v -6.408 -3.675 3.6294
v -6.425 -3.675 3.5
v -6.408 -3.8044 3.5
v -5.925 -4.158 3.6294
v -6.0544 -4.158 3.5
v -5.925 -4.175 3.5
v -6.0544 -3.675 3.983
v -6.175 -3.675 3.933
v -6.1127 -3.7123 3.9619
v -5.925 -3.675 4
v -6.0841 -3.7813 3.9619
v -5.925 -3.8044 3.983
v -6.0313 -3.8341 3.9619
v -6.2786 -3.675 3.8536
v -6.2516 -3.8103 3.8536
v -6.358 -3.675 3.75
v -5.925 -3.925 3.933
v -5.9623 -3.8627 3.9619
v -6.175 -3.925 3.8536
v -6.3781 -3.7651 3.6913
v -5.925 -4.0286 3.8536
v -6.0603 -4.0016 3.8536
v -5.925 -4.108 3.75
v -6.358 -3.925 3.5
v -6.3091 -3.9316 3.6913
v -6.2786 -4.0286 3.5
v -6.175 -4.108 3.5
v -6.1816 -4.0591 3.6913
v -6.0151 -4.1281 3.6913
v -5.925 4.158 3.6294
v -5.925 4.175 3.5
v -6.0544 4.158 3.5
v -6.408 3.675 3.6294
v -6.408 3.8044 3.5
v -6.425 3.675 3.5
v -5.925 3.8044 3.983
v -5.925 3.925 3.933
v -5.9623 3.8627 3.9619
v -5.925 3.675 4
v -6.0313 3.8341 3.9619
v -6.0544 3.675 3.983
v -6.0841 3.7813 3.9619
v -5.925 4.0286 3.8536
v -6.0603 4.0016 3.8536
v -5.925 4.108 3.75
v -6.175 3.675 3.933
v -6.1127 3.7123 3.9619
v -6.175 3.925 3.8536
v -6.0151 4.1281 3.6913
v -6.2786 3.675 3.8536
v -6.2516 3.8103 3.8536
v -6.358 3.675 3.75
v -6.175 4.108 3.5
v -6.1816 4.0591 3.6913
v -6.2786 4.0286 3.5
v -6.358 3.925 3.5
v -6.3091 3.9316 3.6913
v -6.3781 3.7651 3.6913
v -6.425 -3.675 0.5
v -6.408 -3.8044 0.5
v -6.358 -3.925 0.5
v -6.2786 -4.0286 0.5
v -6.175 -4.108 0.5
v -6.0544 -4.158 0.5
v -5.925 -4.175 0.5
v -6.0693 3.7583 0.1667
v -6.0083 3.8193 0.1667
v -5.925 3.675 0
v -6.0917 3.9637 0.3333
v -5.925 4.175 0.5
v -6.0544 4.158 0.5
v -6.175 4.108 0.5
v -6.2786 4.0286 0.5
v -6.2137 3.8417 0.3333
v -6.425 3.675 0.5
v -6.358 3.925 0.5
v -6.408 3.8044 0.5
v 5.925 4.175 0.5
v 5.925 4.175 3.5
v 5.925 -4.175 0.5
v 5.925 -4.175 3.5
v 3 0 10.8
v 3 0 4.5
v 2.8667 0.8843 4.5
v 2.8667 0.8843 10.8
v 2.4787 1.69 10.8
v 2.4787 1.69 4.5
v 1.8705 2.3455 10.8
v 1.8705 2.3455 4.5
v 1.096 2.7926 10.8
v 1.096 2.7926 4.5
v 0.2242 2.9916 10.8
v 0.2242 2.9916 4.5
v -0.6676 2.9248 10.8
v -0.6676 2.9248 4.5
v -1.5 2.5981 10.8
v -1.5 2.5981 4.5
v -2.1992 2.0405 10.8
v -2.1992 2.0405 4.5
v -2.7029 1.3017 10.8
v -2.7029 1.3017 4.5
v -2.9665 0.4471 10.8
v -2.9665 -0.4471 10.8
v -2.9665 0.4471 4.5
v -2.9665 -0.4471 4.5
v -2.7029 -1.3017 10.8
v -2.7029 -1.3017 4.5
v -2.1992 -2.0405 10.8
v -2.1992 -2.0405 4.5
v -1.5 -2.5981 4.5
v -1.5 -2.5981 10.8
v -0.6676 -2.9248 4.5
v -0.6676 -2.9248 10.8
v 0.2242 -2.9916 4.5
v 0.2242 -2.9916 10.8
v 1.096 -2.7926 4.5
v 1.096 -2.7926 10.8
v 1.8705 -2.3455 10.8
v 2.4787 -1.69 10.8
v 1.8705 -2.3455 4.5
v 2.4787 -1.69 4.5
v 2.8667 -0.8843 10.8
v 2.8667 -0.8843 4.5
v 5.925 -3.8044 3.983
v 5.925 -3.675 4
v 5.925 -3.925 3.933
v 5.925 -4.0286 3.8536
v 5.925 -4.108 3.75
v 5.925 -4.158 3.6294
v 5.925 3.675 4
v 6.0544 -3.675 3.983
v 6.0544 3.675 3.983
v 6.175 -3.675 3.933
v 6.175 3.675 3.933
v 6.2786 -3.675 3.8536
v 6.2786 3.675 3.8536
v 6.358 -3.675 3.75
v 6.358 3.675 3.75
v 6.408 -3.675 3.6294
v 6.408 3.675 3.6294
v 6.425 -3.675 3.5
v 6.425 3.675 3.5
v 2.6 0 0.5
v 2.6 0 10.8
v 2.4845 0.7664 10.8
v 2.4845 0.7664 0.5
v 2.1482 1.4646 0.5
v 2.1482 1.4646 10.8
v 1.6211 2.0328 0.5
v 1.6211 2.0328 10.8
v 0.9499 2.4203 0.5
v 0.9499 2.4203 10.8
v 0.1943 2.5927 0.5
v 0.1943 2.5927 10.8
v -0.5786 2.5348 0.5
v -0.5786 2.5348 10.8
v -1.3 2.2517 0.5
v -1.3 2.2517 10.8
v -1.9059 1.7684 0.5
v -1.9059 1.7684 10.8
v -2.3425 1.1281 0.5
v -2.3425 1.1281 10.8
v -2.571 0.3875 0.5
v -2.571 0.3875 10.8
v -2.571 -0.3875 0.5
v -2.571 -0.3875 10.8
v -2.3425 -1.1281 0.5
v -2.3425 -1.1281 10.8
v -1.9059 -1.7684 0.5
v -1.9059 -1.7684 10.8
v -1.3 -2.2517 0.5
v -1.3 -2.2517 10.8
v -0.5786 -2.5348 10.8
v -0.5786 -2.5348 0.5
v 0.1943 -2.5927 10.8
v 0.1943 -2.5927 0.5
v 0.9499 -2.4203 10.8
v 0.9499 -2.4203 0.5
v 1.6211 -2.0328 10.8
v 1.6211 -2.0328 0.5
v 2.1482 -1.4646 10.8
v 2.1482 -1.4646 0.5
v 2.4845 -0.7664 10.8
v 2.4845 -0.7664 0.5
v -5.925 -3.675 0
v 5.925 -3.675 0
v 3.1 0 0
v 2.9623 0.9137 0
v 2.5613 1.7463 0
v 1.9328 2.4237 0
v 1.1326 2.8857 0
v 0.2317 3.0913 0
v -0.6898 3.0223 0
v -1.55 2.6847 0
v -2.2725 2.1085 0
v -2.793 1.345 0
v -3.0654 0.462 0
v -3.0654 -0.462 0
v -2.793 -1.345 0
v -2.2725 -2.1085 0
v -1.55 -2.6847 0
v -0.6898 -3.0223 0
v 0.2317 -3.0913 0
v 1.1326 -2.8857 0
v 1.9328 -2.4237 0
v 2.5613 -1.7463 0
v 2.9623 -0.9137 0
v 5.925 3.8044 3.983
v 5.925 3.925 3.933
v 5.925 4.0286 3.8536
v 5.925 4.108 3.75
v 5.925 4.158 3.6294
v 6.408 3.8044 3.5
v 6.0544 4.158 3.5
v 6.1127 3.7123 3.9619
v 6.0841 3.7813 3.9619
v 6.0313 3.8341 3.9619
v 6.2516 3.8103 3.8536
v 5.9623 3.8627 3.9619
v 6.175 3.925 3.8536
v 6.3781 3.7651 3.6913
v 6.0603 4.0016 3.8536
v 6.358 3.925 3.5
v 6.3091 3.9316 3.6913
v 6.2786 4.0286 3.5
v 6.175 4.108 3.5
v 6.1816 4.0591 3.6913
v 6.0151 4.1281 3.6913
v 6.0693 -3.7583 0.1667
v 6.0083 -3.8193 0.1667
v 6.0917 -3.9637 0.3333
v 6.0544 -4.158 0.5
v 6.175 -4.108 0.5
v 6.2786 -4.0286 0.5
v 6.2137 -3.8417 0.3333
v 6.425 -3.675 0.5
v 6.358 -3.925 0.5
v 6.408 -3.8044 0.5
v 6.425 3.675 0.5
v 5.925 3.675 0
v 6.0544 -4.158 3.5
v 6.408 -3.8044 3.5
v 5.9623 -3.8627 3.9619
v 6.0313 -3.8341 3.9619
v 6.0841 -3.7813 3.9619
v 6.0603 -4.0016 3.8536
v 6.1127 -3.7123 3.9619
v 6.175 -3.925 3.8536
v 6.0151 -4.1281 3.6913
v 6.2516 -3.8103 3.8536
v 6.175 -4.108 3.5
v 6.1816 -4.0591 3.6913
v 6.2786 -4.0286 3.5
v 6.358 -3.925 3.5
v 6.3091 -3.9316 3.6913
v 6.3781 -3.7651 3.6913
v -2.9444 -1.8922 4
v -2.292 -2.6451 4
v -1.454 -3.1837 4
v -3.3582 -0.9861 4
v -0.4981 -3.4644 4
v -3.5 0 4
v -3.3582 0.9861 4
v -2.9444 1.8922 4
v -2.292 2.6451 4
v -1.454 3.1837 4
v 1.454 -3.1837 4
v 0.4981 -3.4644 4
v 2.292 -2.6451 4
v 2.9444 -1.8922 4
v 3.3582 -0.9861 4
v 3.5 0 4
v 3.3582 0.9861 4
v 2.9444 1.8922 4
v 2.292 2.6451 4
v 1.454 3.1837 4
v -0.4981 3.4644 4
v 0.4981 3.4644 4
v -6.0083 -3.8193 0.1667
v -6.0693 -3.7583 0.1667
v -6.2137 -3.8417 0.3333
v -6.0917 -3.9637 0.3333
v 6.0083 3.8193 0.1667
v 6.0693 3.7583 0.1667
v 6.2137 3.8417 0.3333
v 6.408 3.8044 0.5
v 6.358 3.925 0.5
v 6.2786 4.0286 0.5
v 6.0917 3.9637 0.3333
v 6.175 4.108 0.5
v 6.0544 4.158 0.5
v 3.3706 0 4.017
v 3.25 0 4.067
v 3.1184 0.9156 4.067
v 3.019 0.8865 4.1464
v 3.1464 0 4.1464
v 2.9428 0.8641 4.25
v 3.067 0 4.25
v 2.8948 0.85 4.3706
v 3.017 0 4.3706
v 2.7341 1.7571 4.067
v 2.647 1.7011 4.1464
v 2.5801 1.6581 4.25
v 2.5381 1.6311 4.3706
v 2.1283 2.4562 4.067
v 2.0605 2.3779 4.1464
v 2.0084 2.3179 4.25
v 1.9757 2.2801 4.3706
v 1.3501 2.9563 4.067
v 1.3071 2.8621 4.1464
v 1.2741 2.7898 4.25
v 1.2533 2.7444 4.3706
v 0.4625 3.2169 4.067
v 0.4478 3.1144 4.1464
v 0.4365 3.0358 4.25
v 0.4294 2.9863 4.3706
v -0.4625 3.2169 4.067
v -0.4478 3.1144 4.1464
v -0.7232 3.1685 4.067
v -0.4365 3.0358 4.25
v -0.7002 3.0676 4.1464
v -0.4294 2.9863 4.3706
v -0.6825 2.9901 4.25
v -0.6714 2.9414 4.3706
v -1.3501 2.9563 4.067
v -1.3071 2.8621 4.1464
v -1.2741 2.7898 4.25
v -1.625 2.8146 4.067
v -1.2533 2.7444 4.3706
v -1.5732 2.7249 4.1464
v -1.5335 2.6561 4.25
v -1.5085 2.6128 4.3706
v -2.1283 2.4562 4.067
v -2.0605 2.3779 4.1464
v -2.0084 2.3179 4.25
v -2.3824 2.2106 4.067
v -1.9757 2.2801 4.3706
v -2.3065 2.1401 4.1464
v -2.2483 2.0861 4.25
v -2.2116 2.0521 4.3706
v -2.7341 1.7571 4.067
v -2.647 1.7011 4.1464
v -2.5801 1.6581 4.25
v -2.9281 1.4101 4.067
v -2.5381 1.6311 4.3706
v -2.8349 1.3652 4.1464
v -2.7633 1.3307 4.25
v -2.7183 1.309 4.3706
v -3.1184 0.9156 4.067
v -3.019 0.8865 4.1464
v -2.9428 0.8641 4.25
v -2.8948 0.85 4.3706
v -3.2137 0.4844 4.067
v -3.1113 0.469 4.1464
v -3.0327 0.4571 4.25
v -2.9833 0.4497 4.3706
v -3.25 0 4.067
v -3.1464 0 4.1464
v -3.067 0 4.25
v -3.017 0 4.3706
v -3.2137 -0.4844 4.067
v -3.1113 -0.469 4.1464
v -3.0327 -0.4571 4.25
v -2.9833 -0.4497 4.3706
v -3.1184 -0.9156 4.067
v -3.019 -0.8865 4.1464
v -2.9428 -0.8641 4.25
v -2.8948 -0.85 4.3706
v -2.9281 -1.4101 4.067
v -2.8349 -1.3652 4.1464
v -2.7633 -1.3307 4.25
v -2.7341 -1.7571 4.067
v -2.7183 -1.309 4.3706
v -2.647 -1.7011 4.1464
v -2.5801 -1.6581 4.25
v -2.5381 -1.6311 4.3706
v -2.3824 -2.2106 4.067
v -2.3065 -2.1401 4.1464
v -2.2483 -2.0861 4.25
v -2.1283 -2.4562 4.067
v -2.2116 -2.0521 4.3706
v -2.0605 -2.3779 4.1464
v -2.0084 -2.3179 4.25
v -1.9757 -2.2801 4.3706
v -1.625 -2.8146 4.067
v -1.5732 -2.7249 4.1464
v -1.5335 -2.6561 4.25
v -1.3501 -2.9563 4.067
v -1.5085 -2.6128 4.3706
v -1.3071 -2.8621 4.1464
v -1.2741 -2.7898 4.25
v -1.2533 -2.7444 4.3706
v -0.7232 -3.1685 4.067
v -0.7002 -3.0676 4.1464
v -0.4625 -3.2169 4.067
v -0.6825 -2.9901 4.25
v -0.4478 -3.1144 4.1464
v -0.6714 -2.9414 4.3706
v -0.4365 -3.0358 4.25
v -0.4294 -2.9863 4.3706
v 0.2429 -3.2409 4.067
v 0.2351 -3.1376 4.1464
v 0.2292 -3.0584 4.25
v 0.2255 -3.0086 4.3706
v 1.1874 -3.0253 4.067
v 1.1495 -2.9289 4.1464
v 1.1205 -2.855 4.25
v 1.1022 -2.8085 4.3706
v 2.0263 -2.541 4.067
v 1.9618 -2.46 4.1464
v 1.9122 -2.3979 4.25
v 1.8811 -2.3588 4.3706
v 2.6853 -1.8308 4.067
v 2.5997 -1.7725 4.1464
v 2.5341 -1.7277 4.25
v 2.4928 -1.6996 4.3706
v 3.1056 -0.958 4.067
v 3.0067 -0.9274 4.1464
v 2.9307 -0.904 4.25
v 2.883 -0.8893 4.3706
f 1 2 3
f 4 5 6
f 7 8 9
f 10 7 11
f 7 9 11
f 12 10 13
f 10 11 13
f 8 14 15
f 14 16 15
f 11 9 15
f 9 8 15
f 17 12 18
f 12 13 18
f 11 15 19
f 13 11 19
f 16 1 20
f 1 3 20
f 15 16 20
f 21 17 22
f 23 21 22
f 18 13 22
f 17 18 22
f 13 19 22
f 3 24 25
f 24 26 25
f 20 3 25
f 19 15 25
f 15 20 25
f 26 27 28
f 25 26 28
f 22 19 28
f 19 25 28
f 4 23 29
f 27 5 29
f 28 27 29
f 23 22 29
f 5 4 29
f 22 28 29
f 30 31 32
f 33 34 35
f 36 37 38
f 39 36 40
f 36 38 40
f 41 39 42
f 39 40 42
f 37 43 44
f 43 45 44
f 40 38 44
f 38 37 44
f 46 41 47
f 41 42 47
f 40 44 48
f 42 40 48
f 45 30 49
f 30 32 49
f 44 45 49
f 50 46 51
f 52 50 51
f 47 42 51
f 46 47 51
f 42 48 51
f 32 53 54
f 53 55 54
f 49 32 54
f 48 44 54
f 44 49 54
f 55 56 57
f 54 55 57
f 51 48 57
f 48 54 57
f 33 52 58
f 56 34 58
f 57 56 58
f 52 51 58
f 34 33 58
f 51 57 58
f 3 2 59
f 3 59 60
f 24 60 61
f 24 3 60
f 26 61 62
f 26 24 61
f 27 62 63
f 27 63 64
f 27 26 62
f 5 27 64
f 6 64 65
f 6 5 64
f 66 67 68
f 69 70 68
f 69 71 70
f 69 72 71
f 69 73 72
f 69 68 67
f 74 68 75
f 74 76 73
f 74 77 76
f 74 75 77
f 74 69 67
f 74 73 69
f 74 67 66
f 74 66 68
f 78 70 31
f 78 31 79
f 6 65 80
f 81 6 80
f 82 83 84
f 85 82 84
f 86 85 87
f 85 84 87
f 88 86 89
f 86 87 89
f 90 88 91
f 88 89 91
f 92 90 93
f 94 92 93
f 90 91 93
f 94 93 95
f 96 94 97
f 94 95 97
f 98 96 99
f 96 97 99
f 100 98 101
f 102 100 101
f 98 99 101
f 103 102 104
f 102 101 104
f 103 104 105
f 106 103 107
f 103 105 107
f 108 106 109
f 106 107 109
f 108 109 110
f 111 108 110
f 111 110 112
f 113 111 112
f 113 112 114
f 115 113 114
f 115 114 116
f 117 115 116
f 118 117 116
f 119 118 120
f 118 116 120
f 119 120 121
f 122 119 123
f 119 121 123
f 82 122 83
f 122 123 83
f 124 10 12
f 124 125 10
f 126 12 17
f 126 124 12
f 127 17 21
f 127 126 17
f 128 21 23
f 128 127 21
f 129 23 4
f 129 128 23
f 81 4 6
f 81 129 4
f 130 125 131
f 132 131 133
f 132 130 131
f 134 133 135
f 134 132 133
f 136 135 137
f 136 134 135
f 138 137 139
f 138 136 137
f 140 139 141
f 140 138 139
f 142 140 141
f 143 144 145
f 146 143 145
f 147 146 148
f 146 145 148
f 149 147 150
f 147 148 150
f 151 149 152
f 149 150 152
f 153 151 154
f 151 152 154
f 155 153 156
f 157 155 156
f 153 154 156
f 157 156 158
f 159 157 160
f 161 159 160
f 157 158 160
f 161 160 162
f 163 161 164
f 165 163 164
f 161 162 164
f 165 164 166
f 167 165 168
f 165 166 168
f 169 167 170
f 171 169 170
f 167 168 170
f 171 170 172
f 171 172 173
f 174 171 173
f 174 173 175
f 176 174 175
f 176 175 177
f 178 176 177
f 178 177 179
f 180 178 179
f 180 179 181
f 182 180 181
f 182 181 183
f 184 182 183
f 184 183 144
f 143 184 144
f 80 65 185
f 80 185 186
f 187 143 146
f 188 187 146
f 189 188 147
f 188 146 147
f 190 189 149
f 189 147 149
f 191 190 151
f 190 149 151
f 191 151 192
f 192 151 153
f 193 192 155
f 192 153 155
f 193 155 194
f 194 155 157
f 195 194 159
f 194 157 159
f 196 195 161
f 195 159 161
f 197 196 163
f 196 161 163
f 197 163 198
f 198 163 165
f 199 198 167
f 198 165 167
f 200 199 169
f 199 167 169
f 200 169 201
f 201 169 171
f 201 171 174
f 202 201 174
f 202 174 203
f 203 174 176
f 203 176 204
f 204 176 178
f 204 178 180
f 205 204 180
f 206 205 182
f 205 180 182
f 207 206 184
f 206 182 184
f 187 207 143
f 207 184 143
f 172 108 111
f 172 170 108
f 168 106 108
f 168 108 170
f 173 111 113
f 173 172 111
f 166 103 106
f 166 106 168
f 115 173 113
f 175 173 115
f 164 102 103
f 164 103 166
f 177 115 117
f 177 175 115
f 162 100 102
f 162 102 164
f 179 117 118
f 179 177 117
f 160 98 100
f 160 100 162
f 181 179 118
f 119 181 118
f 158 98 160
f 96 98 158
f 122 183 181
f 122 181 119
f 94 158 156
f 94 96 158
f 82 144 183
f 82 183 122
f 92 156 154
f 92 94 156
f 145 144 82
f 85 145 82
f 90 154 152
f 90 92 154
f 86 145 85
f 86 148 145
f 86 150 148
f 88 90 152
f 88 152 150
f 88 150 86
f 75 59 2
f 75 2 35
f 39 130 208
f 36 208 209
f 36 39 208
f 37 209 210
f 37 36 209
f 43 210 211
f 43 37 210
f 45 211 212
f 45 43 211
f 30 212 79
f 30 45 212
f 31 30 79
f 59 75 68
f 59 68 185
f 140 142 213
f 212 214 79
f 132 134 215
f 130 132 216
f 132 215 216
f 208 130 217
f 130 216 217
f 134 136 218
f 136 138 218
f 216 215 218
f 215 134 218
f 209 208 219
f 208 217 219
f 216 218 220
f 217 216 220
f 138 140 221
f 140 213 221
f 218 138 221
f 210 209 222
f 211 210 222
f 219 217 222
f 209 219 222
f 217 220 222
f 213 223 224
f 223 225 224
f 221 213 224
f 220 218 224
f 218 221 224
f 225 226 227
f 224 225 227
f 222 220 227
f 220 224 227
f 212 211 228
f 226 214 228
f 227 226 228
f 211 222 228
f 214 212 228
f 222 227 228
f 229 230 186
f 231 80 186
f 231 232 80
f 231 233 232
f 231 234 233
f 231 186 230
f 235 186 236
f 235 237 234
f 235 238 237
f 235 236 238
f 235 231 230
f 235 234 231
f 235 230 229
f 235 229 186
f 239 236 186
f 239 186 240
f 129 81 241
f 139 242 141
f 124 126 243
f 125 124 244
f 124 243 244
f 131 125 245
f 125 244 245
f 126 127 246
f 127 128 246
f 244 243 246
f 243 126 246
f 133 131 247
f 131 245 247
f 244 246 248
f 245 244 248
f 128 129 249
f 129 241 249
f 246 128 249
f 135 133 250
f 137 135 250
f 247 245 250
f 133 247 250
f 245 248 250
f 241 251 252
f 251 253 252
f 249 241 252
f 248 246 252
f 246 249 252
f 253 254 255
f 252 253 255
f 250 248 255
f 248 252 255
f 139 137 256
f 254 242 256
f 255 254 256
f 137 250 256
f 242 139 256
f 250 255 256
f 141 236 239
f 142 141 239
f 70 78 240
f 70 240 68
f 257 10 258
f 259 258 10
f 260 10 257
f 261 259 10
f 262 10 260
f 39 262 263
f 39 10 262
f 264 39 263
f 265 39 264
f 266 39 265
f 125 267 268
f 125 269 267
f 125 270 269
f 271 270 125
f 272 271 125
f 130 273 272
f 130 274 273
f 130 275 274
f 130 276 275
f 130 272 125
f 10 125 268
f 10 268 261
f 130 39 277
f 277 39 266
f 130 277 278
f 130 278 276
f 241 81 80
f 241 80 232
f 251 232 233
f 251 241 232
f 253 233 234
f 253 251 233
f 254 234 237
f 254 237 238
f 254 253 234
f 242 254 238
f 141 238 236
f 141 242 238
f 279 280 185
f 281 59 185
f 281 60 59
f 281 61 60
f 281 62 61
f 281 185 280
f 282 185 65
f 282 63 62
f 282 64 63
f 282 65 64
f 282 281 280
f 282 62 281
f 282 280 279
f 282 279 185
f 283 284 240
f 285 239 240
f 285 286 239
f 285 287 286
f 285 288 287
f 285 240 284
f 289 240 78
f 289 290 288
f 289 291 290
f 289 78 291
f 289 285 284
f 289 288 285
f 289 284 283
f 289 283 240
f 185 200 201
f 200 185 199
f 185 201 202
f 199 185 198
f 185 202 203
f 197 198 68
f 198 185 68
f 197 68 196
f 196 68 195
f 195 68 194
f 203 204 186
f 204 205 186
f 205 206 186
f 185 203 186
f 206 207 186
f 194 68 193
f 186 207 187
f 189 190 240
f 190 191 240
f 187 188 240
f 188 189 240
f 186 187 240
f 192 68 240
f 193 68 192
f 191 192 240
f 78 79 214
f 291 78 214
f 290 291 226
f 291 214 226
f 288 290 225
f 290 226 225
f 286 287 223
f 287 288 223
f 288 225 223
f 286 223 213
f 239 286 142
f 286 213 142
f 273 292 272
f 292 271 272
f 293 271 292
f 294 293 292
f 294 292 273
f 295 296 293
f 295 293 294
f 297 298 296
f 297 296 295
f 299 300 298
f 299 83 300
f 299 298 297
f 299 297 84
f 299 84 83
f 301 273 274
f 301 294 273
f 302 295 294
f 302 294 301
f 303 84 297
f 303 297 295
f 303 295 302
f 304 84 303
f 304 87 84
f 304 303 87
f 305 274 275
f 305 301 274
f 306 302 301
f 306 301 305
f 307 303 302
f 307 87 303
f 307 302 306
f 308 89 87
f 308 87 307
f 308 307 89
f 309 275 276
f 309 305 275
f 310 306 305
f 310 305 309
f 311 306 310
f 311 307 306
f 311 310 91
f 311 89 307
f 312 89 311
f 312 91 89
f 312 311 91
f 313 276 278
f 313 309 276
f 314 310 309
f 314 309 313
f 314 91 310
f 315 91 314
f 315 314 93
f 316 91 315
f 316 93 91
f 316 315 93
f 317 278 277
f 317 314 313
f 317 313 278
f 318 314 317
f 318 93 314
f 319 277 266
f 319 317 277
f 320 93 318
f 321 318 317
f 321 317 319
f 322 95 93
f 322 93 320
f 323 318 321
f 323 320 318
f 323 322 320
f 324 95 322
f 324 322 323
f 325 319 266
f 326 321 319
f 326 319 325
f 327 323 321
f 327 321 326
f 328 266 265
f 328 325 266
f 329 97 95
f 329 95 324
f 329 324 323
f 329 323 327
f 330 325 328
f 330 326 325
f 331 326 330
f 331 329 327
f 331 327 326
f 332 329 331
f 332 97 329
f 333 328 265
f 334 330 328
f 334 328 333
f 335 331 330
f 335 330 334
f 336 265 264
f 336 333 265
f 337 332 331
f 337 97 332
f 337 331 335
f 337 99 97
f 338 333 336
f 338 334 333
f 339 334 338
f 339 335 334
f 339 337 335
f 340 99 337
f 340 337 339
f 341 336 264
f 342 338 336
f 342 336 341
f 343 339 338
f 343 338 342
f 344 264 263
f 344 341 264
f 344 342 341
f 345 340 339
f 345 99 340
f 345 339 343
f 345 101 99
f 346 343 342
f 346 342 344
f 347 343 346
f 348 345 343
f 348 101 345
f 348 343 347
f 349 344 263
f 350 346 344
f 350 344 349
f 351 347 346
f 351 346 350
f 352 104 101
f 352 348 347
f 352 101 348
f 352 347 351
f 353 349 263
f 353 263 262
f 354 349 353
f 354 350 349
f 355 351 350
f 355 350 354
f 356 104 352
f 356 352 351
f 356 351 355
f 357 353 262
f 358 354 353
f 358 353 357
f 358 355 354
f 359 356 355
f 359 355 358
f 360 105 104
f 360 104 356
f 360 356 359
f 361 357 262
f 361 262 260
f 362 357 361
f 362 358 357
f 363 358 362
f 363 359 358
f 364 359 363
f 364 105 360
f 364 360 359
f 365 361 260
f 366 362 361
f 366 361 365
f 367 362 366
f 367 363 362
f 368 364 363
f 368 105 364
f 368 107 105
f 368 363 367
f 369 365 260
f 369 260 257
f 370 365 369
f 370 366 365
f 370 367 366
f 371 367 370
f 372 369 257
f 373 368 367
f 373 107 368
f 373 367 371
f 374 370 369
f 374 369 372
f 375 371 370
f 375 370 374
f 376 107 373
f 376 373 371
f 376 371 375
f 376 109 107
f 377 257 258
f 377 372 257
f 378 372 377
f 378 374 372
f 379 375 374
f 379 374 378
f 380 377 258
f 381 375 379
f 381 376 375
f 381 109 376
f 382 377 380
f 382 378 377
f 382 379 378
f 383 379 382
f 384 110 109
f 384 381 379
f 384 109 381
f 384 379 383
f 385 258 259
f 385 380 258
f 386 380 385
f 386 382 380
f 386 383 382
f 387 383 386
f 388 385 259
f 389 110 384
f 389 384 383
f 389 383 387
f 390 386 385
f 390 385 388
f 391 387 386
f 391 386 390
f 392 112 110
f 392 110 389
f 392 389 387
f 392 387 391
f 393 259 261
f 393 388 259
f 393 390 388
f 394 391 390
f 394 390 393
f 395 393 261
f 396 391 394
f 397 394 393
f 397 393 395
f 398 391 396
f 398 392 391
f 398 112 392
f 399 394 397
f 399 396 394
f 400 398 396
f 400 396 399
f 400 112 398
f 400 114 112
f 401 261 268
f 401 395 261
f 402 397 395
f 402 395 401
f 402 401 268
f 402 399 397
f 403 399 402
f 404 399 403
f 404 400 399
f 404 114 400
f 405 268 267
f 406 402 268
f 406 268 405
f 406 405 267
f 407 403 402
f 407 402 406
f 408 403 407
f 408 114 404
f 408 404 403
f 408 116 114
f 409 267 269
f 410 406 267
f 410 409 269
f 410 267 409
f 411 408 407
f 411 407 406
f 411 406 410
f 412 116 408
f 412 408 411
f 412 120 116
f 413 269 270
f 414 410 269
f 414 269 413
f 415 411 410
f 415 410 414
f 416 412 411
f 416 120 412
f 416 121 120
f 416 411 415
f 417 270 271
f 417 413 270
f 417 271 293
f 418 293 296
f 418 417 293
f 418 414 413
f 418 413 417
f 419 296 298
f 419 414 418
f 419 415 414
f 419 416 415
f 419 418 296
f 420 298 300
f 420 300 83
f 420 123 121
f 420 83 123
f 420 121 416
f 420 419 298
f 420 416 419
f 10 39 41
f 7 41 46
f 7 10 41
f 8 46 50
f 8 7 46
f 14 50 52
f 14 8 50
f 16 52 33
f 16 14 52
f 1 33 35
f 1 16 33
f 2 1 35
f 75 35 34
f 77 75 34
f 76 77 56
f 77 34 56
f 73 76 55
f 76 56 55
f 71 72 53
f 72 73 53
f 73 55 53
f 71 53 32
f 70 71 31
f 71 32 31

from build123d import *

# Parameters (mm, degrees)
F0_W     = 12.85
F0_H     = 8.35
F1_DEPTH = 4
F2_R     = 3
F3_DEPTH = 6.8
F4_R     = 2.6
F5_DEPTH = 10.801
F6_R     = 0.5
F7_R     = 0.5
F8_SIZE  = 0.49999


# Not quite as in the source:
# - a fillet or chamfer is up to 0.001 mm smaller than in the source, because OpenCascade refuses the exact size


with BuildPart() as f1:
    # F0 (on Top) → F1 (new body)
    with BuildSketch(Plane.XY):
        Rectangle(F0_W, F0_H)
    extrude(amount=F1_DEPTH)

    # F2 (on face) → F3 (join)
    with BuildSketch(Plane.XY.offset(4)):
        Circle(F2_R)
    extrude(amount=F3_DEPTH)

    # F4 (on face) → F5 (cut, through all)
    with BuildSketch(Plane.XY.offset(10.8)):
        Circle(F4_R)
    extrude(amount=-F5_DEPTH, mode=Mode.SUBTRACT)

    # F6
    f6_edges = [f1.edges().sort_by_distance(p)[0] for p in [
        (-6.425, 4.175, 2),
        (6.425, 4.175, 2),
        (6.425, -4.175, 2),
        (-6.425, -4.175, 2),
    ]]
    fillet(f6_edges, radius=F6_R)

    # F7
    f7_edges = [f1.edges().sort_by_distance(p)[0] for p in [
        (0, -4.175, 4),
        (-6.278553, -4.028553, 4),
        (6.278553, -4.028553, 4),
        (-6.425, 0, 4),
        (6.425, 0, 4),
        (-6.278553, 4.028553, 4),
        (6.278553, 4.028553, 4),
        (0, 4.175, 4),
        (-3, 0, 4),
    ]]
    fillet(f7_edges, radius=F7_R)

    # F8 (size 0.5 in the source; OpenCascade refuses exactly that, so slightly less here)
    f8_edges = [f1.edges().sort_by_distance(p)[0] for p in [
        (0, -4.175, 0),
        (-6.278553, -4.028553, 0),
        (6.278553, -4.028553, 0),
        (-6.425, 0, 0),
        (6.425, 0, 0),
        (-6.278553, 4.028553, 0),
        (6.278553, 4.028553, 0),
        (0, 4.175, 0),
        (-2.6, 0, 0),
    ]]
    chamfer(f8_edges, length=F8_SIZE)


solid = f1.part
